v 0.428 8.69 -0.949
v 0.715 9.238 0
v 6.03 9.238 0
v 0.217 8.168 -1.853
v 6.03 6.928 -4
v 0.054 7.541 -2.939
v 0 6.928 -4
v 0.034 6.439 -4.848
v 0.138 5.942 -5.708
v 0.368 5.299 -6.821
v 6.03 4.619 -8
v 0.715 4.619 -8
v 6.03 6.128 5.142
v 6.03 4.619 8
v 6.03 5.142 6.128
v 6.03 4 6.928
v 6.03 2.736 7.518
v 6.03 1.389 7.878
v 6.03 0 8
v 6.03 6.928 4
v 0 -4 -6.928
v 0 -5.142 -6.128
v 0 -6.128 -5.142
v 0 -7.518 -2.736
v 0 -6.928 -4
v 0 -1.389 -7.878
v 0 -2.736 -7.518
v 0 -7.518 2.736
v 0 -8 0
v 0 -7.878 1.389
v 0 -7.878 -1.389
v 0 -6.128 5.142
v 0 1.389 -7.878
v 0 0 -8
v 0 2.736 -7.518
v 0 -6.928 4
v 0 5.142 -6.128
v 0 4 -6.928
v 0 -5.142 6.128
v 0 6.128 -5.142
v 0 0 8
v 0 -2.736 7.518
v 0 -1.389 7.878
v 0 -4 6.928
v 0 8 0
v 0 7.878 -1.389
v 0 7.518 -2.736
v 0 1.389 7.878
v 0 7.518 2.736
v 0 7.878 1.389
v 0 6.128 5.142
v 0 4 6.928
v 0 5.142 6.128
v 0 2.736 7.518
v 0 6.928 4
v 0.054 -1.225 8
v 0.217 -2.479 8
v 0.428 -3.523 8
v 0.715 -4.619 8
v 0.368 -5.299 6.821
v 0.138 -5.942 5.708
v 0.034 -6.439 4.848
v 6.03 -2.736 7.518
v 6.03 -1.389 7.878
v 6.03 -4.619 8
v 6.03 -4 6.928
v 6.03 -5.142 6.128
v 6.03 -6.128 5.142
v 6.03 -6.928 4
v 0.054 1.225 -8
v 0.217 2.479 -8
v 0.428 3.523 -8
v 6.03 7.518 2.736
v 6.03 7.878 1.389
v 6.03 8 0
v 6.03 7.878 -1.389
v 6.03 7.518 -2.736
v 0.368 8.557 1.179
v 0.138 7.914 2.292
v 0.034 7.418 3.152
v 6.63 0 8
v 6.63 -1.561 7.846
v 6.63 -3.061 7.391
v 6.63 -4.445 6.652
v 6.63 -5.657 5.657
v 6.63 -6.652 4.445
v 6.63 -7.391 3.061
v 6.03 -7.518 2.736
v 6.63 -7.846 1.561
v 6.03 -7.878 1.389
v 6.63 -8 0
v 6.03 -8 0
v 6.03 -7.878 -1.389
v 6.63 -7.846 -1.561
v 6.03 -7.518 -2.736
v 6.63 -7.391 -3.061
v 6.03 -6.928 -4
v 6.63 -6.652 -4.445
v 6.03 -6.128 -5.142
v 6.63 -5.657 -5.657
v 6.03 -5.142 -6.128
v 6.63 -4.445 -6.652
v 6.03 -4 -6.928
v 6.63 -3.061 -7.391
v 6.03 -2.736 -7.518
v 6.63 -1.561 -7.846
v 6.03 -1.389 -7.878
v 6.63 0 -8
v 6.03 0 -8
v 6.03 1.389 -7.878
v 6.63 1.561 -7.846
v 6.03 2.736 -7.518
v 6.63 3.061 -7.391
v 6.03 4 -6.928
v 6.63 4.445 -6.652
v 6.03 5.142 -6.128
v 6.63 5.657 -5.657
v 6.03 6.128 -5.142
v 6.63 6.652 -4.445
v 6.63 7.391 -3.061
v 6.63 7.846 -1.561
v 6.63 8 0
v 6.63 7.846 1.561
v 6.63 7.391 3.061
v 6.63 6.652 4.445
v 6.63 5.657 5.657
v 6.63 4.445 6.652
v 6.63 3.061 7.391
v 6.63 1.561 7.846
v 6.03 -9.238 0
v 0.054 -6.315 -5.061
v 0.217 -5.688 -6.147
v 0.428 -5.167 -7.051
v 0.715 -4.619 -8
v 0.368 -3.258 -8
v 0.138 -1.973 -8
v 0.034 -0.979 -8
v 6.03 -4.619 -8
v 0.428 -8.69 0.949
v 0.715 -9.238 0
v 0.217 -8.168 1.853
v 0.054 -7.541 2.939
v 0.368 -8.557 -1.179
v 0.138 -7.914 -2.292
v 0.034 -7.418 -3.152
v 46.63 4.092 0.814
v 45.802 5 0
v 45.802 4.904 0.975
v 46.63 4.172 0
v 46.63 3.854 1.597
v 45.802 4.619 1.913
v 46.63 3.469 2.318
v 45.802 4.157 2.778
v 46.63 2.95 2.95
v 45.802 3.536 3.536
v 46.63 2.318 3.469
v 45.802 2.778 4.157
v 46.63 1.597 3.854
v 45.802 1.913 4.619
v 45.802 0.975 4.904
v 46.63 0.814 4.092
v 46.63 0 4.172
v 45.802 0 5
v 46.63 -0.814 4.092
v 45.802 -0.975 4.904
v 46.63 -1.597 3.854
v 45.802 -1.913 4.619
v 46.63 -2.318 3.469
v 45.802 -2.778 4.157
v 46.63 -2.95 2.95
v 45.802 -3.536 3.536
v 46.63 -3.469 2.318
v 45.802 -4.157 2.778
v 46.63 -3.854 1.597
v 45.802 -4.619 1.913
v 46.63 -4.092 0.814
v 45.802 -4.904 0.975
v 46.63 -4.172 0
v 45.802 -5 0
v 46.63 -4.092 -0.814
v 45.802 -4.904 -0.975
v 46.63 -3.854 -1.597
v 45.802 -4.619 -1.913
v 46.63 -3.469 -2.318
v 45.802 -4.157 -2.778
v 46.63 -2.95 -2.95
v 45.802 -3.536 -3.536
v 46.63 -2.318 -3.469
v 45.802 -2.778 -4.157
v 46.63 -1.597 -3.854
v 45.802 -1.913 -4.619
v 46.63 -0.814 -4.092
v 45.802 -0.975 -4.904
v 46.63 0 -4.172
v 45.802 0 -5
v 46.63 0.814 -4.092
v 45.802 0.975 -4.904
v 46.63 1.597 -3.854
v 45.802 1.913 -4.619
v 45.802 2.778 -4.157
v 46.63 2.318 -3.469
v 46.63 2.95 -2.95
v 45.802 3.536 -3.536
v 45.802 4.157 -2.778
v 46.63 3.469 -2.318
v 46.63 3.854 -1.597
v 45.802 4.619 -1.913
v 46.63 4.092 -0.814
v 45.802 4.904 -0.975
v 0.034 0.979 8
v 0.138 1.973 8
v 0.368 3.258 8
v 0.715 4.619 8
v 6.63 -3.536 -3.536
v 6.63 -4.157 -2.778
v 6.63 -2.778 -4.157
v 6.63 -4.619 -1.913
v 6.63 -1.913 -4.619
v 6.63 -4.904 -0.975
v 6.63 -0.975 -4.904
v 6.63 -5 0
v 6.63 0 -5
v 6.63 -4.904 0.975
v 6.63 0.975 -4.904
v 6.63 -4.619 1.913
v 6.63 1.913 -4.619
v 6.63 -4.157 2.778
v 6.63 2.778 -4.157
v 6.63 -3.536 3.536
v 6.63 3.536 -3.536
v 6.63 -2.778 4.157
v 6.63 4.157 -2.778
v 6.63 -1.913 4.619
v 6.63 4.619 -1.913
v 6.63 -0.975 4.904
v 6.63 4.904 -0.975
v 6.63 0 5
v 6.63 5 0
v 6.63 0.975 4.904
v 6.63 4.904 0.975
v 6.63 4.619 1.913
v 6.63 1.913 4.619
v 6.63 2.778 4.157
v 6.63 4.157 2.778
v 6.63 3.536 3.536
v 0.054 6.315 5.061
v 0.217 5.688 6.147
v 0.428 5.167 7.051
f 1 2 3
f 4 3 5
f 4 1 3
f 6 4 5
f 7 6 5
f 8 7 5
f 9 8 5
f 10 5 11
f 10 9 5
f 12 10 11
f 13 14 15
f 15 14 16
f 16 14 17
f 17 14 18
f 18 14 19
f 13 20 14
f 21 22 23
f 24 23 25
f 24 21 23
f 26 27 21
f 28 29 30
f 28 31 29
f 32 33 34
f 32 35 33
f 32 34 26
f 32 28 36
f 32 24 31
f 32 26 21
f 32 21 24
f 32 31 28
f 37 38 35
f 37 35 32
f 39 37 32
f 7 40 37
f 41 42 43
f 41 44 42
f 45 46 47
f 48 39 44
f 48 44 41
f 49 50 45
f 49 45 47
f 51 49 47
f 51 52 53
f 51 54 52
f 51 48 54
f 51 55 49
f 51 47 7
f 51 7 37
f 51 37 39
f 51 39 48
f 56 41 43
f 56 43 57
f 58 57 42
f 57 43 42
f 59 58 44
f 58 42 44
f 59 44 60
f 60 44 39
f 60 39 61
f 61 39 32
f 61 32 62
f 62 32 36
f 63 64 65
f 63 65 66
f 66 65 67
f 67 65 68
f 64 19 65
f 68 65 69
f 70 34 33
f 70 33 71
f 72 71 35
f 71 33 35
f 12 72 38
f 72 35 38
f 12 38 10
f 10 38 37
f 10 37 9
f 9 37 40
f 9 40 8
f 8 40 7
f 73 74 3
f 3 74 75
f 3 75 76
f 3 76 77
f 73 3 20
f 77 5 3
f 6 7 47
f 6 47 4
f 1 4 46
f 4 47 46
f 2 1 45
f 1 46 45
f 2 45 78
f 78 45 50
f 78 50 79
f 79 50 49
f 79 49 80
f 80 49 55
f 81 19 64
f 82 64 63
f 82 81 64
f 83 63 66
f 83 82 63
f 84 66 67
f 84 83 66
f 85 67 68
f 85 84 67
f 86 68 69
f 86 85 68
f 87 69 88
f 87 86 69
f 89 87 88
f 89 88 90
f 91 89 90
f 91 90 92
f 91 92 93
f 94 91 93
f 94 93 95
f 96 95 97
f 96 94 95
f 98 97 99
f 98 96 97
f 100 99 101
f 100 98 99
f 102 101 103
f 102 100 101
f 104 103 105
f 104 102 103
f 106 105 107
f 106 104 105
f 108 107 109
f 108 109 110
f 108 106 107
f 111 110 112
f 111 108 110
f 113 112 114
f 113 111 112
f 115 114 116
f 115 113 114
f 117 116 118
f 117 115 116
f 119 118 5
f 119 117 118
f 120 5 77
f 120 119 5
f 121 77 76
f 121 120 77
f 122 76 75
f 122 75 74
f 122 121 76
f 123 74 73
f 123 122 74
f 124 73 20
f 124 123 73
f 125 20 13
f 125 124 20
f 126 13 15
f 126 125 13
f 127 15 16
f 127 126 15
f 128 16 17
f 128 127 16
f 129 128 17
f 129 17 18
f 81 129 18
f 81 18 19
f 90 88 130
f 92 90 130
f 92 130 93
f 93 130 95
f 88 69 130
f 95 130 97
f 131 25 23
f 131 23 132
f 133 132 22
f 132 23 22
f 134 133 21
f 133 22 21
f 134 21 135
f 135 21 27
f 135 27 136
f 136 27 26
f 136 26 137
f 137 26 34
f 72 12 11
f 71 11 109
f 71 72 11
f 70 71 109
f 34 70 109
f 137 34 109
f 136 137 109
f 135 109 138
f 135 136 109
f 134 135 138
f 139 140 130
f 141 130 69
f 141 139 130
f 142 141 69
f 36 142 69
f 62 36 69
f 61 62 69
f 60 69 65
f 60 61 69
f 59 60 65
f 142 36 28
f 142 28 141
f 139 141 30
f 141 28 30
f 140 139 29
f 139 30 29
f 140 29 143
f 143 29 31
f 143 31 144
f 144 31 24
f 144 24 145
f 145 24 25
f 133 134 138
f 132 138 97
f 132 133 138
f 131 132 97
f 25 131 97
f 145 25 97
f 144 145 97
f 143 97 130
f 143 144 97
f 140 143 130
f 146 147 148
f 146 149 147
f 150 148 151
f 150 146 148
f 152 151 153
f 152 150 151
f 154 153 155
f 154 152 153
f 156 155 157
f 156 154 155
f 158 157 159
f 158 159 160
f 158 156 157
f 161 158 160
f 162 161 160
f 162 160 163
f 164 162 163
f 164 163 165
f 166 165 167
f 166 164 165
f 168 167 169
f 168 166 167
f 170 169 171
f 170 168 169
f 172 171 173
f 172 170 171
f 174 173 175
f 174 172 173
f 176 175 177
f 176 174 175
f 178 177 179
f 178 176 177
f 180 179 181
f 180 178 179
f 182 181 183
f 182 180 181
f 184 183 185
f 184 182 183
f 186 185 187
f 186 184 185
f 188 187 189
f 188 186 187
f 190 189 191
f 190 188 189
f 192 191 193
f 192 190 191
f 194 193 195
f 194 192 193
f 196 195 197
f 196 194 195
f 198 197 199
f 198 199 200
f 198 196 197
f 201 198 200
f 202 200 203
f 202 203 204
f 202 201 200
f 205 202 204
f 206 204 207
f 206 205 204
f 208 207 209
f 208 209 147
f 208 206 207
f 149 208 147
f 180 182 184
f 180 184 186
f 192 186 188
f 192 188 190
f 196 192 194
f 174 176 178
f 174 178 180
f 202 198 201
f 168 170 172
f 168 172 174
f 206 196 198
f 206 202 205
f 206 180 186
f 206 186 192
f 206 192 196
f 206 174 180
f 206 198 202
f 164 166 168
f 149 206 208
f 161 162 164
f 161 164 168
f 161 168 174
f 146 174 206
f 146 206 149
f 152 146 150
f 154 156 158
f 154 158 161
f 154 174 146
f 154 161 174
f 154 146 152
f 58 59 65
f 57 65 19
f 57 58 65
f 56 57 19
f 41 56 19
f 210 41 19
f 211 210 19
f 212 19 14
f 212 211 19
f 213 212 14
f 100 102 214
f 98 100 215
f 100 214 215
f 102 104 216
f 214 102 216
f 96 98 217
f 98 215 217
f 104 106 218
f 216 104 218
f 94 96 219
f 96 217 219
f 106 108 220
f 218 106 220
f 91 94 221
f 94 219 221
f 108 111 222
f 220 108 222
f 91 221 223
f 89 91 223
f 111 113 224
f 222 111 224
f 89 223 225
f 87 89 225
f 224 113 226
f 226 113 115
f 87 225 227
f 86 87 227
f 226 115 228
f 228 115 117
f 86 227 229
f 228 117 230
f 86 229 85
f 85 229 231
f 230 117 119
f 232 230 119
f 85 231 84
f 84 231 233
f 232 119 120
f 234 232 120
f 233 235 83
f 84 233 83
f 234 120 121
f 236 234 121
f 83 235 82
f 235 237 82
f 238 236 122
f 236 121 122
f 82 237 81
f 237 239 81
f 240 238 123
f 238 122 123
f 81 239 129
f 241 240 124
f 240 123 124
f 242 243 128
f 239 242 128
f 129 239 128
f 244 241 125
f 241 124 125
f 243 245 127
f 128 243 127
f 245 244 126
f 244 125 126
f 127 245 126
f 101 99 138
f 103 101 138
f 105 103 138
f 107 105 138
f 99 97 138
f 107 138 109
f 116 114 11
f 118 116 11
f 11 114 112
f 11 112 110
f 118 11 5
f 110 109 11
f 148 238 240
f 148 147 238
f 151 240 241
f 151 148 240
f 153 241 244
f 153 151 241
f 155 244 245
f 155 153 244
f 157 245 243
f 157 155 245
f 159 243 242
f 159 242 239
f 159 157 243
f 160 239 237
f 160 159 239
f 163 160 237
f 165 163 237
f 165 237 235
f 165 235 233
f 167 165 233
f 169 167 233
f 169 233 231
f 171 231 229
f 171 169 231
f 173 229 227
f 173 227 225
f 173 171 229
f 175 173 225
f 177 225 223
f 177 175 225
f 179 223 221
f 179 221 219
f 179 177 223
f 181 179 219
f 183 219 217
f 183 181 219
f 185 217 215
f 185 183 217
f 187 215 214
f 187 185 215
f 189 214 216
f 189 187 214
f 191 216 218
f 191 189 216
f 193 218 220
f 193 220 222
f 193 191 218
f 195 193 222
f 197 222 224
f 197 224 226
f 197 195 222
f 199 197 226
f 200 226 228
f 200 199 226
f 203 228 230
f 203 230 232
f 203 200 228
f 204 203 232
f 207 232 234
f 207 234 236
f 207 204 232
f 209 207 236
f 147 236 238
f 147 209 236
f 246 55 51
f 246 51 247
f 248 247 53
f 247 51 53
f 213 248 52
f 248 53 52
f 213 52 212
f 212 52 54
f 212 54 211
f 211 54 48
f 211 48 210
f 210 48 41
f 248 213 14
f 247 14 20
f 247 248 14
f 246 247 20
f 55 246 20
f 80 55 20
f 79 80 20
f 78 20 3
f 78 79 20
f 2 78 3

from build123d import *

# Parameters (mm, degrees)
BASEHEAD_DEPTH = 6.63
SKETCH4_W      = 0.6
SKETCH4_H      = 11.237604307


# Read off the part's stored shape, not the designer's step: HeadChamfer
with BuildPart() as part:
    # Sketch1 → BaseHead (new body)
    with BuildSketch(Plane(origin=(0, 0, 0), x_dir=(0, 0, -1), z_dir=(1, 0, 0))):
        Polygon((8, 4.618802154), (8, -4.618802154), (0, -9.237604307), (-8, -4.618802154), (-8, 4.618802154), (0, 9.237604307), align=None)
    extrude(amount=BASEHEAD_DEPTH)

    # HeadChamfer outline → HeadChamfer (revolve, cut)
    with BuildSketch(Plane.YX):
        Polygon((9.237604311, 0.714531182), (8, 0), (9.237604311, 0), align=None)
    revolve(axis=Axis((0, 0, 0), (1, 0, 0)), mode=Mode.SUBTRACT)

    # HeadChamfer 2 outline → HeadChamfer 2 (revolve)
    with BuildSketch(Plane.YX):
        Polygon((5, 6.63), (5, 45.802), (4.172, 46.63), (0, 46.63), (0, 6.63), align=None)
    revolve(axis=Axis((0, 0, 0), (1, 0, 0)))

    # Sketch4 → BearingFace (revolve, cut)
    with BuildSketch(Plane.XY, mode=Mode.PRIVATE) as bearingface_sk:
        with Locations((6.33, 13.618802154)):
            Rectangle(SKETCH4_W, SKETCH4_H)
    revolve(bearingface_sk.sketch.rotate(Axis((0, 0, 0), (1, 0, 0)), 90), axis=Axis((0, 0, 0), (1, 0, 0)), mode=Mode.SUBTRACT)


solid = part.part
